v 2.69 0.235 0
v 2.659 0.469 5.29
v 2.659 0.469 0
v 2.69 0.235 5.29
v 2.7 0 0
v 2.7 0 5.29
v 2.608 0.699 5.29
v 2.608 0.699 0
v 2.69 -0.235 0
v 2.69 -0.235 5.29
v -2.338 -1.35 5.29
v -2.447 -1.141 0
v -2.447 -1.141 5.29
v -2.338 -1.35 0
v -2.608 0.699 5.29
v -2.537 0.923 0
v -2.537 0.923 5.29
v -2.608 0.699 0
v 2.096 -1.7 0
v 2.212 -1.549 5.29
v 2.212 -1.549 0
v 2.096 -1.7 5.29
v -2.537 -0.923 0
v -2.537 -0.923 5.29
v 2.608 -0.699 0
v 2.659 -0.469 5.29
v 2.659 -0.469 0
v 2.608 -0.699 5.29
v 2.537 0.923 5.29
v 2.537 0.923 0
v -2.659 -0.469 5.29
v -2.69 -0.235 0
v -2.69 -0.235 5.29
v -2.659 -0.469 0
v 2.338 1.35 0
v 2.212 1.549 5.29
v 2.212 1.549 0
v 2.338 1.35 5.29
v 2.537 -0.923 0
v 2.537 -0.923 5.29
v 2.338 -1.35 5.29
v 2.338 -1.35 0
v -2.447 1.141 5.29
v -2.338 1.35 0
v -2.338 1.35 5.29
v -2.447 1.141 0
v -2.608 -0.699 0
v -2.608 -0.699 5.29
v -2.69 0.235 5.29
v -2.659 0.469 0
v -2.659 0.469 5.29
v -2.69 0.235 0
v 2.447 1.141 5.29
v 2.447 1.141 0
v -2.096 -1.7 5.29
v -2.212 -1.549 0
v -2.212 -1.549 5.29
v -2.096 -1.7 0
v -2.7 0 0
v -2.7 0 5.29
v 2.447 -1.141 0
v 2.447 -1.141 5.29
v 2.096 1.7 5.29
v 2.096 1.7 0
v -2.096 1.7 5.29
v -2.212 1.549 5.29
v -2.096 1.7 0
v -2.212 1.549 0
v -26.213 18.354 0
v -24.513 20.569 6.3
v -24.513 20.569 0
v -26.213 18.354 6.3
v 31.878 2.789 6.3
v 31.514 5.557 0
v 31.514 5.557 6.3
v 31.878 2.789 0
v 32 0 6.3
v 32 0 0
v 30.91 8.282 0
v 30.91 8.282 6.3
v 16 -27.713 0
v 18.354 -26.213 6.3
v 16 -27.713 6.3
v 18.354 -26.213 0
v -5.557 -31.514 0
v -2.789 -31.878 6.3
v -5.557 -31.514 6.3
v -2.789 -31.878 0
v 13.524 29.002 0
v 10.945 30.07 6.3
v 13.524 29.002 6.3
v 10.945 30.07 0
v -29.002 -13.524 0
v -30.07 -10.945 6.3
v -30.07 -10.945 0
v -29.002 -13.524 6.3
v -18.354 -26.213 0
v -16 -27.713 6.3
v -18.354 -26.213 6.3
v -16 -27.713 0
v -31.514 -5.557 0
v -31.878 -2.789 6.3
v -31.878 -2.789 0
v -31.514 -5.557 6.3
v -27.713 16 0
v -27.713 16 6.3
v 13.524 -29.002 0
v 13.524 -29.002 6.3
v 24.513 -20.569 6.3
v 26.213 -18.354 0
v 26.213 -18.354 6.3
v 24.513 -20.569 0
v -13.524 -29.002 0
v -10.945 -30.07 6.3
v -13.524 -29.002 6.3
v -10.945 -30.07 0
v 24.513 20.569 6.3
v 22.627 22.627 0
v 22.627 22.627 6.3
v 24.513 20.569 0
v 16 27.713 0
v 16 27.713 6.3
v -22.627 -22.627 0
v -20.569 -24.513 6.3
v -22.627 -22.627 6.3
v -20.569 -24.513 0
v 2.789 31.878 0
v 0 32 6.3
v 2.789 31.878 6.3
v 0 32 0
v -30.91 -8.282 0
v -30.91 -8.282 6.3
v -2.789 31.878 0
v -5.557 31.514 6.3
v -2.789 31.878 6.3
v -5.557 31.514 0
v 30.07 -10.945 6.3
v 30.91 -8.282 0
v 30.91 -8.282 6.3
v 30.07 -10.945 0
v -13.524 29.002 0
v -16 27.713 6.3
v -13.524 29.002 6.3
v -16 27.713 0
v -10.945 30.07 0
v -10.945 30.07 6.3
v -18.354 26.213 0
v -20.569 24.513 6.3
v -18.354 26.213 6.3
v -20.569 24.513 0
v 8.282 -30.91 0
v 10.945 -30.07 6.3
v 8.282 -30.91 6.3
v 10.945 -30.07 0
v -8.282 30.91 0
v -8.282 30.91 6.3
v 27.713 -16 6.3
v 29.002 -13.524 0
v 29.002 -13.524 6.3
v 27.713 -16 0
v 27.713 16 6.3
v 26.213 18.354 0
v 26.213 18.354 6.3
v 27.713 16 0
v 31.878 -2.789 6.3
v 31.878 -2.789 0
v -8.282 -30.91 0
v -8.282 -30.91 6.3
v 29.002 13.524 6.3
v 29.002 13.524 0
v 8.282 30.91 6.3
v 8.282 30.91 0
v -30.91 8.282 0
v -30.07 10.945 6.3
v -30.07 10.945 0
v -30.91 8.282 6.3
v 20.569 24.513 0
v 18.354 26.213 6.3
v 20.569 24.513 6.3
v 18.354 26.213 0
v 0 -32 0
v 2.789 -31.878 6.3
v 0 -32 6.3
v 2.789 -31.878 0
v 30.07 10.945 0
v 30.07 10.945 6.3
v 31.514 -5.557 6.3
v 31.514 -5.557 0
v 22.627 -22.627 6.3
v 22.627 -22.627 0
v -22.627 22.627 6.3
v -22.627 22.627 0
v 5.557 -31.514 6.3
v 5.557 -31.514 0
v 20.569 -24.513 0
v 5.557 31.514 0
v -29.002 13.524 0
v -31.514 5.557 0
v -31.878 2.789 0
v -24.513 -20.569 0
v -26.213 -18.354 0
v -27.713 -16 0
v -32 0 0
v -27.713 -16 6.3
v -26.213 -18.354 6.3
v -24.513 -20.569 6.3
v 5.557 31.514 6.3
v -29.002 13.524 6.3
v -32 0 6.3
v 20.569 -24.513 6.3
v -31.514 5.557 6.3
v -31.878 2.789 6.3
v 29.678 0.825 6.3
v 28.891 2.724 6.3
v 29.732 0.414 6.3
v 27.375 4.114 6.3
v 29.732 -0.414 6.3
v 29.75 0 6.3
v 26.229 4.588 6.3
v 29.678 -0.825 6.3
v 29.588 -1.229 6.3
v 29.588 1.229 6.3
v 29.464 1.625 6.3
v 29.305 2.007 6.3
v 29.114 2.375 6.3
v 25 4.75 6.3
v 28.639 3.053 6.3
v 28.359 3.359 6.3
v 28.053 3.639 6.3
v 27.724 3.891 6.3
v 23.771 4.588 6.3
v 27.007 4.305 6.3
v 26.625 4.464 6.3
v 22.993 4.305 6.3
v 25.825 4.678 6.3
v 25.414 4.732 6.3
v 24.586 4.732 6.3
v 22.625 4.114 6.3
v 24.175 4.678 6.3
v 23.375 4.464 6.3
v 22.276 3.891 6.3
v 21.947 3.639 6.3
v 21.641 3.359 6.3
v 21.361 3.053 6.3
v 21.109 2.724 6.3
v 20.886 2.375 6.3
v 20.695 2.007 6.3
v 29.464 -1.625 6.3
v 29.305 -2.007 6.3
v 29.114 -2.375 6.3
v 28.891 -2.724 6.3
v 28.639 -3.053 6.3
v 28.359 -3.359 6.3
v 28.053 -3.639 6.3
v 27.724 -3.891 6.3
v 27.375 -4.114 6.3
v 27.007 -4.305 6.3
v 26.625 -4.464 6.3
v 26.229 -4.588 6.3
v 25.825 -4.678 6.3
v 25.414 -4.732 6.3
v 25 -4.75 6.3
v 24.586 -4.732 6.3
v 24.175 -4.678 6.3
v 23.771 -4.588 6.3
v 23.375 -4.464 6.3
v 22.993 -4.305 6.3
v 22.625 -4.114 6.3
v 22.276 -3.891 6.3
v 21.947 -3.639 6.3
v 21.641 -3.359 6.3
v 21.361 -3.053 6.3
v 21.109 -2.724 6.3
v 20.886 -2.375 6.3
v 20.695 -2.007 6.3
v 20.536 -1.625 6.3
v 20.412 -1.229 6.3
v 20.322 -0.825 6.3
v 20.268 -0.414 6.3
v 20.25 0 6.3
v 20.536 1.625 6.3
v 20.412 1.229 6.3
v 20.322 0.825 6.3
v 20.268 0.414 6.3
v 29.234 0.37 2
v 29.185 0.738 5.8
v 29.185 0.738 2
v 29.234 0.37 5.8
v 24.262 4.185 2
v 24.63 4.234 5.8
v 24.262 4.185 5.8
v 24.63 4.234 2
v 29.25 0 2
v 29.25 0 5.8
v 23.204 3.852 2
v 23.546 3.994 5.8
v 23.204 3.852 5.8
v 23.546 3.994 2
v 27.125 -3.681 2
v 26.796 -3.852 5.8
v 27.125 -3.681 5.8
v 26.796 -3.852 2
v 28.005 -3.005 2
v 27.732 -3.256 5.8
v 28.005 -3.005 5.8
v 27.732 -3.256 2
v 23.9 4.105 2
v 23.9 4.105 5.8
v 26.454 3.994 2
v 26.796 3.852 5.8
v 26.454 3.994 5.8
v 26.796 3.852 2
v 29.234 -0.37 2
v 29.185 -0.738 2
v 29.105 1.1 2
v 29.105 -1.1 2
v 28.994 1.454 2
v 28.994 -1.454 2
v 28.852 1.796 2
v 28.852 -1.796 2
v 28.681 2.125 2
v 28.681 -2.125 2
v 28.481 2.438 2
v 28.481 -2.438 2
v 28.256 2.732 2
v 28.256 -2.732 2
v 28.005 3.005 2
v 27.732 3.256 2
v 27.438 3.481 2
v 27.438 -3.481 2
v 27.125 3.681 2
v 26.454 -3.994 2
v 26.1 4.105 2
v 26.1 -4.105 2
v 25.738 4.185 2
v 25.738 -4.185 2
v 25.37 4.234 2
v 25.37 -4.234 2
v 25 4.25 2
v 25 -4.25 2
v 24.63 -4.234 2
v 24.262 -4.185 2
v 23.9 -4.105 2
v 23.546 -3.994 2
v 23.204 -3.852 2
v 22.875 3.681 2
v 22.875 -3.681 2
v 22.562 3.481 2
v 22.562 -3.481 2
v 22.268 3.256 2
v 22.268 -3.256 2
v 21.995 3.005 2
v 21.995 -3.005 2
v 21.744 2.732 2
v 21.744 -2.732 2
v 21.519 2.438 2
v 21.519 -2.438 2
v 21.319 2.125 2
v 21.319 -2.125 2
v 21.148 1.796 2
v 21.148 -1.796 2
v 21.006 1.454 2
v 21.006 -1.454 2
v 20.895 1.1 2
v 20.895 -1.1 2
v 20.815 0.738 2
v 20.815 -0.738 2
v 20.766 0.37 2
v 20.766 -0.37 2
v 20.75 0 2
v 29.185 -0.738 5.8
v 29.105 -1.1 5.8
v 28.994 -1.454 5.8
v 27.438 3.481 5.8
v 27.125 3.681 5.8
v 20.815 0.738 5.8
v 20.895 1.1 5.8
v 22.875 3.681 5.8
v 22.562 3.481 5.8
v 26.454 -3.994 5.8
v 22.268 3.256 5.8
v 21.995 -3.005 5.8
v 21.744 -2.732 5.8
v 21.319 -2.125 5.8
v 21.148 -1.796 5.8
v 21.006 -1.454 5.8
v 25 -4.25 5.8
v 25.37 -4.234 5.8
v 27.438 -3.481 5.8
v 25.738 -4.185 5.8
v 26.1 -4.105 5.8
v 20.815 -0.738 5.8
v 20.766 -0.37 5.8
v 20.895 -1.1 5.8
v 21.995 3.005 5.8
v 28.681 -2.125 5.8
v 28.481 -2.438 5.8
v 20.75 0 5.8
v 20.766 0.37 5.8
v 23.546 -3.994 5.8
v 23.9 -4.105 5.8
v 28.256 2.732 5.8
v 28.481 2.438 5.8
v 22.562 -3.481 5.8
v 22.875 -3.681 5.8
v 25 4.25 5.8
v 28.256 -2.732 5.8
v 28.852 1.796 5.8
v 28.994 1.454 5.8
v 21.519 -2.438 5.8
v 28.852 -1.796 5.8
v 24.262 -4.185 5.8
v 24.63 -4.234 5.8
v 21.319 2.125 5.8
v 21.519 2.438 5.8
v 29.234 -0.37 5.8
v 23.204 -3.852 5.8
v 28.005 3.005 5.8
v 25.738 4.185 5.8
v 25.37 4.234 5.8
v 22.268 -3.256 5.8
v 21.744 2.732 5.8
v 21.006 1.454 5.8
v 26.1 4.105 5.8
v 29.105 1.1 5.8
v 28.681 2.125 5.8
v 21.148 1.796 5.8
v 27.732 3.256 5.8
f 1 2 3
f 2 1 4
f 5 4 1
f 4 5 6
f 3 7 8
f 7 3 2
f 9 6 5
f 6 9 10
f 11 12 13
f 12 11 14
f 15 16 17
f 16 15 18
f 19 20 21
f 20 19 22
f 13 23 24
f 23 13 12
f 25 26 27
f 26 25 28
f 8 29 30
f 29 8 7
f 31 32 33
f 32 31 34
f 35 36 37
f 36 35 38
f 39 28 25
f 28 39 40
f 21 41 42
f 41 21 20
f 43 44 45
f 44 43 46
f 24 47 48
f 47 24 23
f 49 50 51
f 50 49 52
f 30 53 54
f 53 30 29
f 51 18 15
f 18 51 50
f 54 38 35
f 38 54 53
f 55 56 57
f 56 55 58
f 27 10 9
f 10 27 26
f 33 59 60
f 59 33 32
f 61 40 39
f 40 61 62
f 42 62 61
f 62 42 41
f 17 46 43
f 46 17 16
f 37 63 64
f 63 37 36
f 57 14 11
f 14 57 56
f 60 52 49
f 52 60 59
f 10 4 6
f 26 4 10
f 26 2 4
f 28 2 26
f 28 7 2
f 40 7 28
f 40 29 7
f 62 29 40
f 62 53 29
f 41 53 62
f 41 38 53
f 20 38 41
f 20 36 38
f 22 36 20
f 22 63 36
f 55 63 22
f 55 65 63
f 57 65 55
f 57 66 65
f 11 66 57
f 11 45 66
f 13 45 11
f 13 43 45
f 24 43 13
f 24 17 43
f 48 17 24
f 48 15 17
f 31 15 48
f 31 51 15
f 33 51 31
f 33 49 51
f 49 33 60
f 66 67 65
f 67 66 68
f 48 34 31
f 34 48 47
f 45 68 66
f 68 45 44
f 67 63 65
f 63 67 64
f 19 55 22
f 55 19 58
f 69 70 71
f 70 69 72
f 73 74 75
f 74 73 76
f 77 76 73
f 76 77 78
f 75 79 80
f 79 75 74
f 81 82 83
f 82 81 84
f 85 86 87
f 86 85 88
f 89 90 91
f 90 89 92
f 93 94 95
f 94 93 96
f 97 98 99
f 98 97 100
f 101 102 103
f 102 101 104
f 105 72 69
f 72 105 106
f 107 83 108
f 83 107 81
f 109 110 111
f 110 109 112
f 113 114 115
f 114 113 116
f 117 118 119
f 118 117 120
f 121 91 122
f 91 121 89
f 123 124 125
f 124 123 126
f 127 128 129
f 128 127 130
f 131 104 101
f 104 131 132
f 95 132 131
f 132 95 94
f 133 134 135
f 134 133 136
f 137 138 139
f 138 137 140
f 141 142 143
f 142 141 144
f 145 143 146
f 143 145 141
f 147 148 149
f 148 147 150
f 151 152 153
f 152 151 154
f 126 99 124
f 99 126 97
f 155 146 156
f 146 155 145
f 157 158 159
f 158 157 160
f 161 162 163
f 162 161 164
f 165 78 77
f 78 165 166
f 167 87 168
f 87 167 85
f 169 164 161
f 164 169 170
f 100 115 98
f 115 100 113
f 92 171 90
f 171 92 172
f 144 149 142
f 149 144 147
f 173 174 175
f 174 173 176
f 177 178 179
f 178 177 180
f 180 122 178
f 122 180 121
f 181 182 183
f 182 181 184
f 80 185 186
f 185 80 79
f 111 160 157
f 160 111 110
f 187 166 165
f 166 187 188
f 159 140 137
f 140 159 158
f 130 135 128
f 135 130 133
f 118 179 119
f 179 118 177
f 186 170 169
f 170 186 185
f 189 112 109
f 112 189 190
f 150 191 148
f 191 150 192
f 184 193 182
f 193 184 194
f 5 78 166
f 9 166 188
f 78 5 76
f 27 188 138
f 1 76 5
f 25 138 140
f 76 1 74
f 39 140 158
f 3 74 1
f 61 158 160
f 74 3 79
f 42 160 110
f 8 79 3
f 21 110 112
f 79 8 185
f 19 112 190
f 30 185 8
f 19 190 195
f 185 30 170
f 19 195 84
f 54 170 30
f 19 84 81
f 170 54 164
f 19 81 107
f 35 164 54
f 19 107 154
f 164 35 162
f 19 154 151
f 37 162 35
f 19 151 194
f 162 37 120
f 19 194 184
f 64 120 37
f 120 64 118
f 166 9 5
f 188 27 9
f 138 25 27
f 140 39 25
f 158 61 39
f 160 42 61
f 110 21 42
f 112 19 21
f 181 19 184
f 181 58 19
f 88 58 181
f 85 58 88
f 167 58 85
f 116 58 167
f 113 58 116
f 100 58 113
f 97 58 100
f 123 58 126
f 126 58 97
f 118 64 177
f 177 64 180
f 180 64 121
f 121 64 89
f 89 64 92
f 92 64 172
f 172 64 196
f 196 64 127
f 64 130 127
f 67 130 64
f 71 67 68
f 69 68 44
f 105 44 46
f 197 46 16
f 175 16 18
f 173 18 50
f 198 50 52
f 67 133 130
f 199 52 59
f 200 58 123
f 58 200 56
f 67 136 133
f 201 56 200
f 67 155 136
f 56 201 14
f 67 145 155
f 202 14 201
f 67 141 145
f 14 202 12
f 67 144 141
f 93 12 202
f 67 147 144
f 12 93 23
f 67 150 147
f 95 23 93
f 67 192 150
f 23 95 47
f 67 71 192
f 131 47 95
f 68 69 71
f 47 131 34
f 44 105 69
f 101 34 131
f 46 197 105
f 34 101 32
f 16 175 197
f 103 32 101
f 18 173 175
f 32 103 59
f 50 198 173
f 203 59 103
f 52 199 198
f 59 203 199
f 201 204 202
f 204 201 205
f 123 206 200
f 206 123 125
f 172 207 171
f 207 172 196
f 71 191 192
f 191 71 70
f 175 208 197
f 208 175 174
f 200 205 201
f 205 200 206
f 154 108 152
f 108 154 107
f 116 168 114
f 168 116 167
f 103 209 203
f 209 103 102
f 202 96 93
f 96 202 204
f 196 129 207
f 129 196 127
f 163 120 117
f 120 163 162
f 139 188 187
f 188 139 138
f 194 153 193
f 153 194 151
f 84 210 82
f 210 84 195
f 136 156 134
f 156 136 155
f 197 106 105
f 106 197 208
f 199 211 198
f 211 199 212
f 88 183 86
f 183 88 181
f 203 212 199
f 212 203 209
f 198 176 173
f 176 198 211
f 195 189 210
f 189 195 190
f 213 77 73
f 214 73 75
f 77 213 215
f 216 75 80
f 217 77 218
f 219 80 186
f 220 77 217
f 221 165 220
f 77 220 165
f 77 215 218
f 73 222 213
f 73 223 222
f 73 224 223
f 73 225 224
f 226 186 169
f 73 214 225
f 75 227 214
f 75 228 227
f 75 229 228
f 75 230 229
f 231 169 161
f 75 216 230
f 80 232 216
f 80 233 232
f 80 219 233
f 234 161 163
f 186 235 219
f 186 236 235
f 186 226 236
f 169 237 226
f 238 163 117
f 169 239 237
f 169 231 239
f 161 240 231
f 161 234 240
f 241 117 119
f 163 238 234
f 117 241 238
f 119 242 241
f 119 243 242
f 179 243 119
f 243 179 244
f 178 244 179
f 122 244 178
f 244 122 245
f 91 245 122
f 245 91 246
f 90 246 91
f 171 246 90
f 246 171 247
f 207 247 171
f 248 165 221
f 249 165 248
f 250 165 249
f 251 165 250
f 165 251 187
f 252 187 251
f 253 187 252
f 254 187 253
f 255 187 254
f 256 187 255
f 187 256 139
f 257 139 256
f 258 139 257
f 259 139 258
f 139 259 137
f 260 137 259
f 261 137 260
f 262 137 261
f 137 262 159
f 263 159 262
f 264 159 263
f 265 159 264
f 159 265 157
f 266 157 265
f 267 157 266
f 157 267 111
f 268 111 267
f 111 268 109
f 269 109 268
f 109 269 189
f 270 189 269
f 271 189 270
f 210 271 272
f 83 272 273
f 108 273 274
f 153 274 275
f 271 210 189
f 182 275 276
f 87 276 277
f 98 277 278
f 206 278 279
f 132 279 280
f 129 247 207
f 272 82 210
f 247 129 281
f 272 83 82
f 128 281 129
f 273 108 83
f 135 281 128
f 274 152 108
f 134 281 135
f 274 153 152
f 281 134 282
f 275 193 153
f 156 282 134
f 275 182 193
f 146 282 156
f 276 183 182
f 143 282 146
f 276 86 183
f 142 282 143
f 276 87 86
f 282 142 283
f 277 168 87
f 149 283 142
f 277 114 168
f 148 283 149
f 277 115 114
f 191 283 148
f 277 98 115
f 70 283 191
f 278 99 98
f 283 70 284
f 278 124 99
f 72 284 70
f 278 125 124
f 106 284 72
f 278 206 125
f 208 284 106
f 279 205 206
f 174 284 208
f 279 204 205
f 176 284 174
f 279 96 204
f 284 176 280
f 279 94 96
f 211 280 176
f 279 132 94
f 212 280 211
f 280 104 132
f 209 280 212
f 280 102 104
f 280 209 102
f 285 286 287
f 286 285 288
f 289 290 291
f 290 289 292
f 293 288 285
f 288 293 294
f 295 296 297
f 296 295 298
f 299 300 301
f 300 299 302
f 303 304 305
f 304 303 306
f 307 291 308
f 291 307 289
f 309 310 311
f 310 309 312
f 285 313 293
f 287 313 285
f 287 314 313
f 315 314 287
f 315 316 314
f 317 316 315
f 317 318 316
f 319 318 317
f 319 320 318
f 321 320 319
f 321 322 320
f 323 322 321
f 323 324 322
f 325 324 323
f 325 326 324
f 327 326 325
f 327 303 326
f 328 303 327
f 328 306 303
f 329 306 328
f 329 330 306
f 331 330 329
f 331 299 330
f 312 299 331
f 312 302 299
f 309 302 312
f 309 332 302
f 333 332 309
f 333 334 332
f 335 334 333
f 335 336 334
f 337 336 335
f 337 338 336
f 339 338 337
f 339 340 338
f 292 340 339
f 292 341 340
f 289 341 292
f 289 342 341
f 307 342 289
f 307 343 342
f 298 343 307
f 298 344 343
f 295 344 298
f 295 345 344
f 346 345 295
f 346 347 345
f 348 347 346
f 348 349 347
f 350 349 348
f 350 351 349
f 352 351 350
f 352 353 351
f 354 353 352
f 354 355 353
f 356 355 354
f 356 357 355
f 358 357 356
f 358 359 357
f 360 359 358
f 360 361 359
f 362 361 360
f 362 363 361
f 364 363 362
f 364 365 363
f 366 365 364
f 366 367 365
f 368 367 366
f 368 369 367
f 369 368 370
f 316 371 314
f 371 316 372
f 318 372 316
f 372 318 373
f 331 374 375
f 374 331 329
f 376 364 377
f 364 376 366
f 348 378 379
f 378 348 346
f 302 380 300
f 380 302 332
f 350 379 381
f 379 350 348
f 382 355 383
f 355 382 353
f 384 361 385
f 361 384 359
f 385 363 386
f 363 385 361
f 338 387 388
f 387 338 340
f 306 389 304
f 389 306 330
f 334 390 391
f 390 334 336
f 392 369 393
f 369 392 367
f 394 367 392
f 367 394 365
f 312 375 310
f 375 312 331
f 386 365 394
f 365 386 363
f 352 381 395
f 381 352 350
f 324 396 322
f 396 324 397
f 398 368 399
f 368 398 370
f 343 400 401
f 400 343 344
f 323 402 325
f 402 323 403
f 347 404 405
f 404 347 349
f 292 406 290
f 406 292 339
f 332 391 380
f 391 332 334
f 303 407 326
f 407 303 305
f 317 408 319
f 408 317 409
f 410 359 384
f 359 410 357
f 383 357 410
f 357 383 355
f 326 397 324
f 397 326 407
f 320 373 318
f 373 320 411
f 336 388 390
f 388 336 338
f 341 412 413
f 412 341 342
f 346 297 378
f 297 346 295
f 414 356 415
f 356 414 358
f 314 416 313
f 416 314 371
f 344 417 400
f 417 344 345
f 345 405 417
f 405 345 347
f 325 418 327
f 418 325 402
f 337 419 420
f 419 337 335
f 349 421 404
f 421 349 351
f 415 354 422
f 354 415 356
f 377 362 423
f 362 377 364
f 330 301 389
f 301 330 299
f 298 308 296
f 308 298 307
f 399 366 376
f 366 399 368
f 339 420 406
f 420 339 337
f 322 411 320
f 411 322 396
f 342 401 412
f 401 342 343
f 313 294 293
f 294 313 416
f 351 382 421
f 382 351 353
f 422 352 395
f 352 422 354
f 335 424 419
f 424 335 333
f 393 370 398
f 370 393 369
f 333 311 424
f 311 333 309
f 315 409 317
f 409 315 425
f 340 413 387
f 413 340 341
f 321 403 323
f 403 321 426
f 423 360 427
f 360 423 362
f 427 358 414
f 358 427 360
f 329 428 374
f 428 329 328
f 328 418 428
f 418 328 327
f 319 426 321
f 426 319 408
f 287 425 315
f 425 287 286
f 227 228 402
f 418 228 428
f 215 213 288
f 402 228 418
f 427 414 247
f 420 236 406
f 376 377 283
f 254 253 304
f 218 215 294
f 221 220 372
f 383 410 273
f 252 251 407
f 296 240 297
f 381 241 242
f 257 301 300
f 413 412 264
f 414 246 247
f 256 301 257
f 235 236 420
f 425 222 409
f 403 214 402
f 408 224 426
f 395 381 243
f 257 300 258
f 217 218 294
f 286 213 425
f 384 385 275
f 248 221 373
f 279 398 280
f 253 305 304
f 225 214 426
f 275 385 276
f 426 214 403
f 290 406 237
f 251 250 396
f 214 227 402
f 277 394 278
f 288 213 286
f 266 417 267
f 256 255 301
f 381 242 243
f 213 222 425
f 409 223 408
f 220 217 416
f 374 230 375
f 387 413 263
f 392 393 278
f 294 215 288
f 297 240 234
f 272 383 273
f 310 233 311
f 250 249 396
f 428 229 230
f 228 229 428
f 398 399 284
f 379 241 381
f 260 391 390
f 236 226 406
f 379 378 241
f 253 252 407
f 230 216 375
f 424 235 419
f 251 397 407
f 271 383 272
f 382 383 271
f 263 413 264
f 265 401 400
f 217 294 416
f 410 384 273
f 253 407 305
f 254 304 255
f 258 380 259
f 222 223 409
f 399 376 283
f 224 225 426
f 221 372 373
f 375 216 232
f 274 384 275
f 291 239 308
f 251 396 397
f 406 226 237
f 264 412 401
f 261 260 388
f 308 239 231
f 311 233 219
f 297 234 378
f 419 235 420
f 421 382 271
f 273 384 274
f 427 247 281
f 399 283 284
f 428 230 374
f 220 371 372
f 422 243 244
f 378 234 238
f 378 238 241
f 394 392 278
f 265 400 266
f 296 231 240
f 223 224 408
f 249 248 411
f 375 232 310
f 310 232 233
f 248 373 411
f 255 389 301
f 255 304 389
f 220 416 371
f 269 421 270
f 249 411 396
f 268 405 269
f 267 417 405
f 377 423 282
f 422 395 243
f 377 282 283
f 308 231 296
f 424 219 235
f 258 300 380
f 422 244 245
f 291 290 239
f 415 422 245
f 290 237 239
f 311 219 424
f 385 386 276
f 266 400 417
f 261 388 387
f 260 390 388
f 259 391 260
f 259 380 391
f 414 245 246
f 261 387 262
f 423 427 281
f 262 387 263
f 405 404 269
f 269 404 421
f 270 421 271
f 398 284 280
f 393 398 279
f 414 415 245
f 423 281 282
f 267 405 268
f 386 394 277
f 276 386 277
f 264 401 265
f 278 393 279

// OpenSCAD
// file: lib/stepper_28byj48.scad
// 28BYJ-48 reference body. Shaft axis at the origin; body offset +shaft_offset in X, ears along Y.
include <../params.scad>

module d_shaft(d = shaft_d, flat = shaft_flat, h = shaft_len) {
    // D profile: circle d, cut to `flat` across-flats thickness (flats on +/-Y)
    intersection() {
        cylinder(d = d, h = h);
        translate([-d, -flat / 2, -1]) cube([2 * d, flat, h + 2]);
    }
}

module stepper_28byj48() {
    // body hangs below z=0 (top of body at z=0), shaft up from z=0
    translate([shaft_offset, 0, -motor_body_h]) cylinder(d = motor_body_d, h = motor_body_h);
    // mount ears along Y
    translate([shaft_offset, 0, -1.0])
        hull() {
            translate([0, -motor_ear_span / 2, 0]) cylinder(d = 7, h = 1);
            translate([0,  motor_ear_span / 2, 0]) cylinder(d = 7, h = 1);
        }
    // shaft
    d_shaft();
}

module stepper_mount_holes(h) {
    // two ear holes and shaft hole, cutters spanning z = -1 .. h
    for (s = [-1, 1])
        translate([shaft_offset, s * motor_ear_span / 2, -1])
            cylinder(d = motor_ear_hole, h = h + 2);
    translate([0, 0, -1]) cylinder(d = shaft_d + 1, h = h + 2);
}
// file: params.scad
// Shared parameters for the pill-metering module. All units mm.
$fn = 72;

pill_type = "tablet";      // "tablet" or "capsule"
pill_length = 8;           // pill length
pill_width = 8;            // pill width
pill_thickness = 4;        // pill thickness
// Capsule preset: pill_type="capsule"; pill_length=21.7; pill_width=7.6; pill_thickness=7.6;

pocket_w = pill_width + 0.5;          // pocket width
pocket_l = pill_length + 0.5;         // pocket length
pocket_depth = pill_thickness + 0.3;  // pocket depth

disk_d = 64;                          // disk diameter
disk_gap = 0.5;                       // disk top sits this far below plate top (wiper reaches through)
disk_floor = 2;                       // material under pocket
disk_t = pocket_depth + disk_floor;   // disk thickness
pocket_r = 25;                        // disk center to pocket center
disk_recess_clear = 0.3;              // radial clearance in plate recess

plate_w = 90;                         // plate square size
plate_t = 5;                          // plate thickness under disk
recess_depth = disk_t + disk_gap;     // recess depth in plate top
plate_h = plate_t + recess_depth;     // total plate block height
recess_d = disk_d + 2 * disk_recess_clear; // recess diameter

drop_hole_d = max(pocket_l, pocket_w) + 1; // drop hole diameter (at 180 deg)

hopper_id = 36;                     // hopper inner diameter
hopper_wall = 2;                      // hopper wall thickness
hopper_h = 60;                        // hopper tube height
hopper_outlet_d = max(pocket_l, pocket_w) + 2; // outlet diameter at (pocket_r,0)
hopper_taper_h = 20;                  // tapered bottom height
hopper_offset = 7;                    // tube center = pocket_r - 7 = 18
hopper_flange_d = 84;                 // flange diameter
flange_t = 3;                         // flange thickness
hopper_bolt_circle_d = 76;            // bolt circle diameter (r=38)
bolt_d = 3.4;                         // hopper flange bolt hole
insert_bore_d = 4.5;                  // plate bore (heat-set insert)
corner_hole_d = 3.4;                  // enclosure mount holes
corner_inset = 5;                    // corner hole inset from edge

wiper_w = 1.2;                        // wiper slot width
wiper_depth = 10;                     // wiper slot depth
wiper_len = hopper_outlet_d + 4;      // wiper slot length (along X)

motor_body_d = 28;                    // 28BYJ-48 body diameter
motor_body_h = 19;                    // body height
motor_ear_span = 35;                  // mount ear spacing
motor_ear_hole = 4.2;                 // ear hole diameter
shaft_d = 5;                          // D-shaft diameter
shaft_flat = 3;                       // across-flats dimension
shaft_offset = 8;                     // shaft offset from body center
shaft_len = 10;                       // shaft length
shaft_clear = 0.2;                    // socket clearance

chute_inner = 14;                     // chute inner square
chute_wall = 2;                       // chute wall
chute_angle = 45;                     // outward angle
chute_len = 50;                       // chute length
// main file
// Metering disk. Origin at disk center, bottom at z=0.
include <params.scad>
use <lib/stepper_28byj48.scad>

module pocket_shape(extra = 0) {
    // 2D footprint of the pocket (grown by `extra` per side)
    if (pill_type == "tablet") {
        circle(d = pocket_w + 2 * extra);
    } else {
        // slot oriented tangentially (along Y)
        hull() {
            translate([0,  (pocket_l - pocket_w) / 2]) circle(d = pocket_w + 2 * extra);
            translate([0, -(pocket_l - pocket_w) / 2]) circle(d = pocket_w + 2 * extra);
        }
    }
}

module disk() {
    difference() {
        cylinder(d = disk_d, h = disk_t);
        // pocket
        translate([pocket_r, 0, disk_t - pocket_depth])
            linear_extrude(pocket_depth + 1) pocket_shape();
        // 0.5 mm chamfer on lip
        translate([pocket_r, 0, disk_t - 0.5])
            hull() {
                linear_extrude(0.01) pocket_shape();
                translate([0, 0, 0.5]) linear_extrude(0.01) pocket_shape(0.5);
            }
        // D-shaft socket from below, blind
        translate([0, 0, -0.01])
            d_shaft(shaft_d + 2 * shaft_clear, shaft_flat + 2 * shaft_clear, disk_t - 1);
    }
}

disk();
